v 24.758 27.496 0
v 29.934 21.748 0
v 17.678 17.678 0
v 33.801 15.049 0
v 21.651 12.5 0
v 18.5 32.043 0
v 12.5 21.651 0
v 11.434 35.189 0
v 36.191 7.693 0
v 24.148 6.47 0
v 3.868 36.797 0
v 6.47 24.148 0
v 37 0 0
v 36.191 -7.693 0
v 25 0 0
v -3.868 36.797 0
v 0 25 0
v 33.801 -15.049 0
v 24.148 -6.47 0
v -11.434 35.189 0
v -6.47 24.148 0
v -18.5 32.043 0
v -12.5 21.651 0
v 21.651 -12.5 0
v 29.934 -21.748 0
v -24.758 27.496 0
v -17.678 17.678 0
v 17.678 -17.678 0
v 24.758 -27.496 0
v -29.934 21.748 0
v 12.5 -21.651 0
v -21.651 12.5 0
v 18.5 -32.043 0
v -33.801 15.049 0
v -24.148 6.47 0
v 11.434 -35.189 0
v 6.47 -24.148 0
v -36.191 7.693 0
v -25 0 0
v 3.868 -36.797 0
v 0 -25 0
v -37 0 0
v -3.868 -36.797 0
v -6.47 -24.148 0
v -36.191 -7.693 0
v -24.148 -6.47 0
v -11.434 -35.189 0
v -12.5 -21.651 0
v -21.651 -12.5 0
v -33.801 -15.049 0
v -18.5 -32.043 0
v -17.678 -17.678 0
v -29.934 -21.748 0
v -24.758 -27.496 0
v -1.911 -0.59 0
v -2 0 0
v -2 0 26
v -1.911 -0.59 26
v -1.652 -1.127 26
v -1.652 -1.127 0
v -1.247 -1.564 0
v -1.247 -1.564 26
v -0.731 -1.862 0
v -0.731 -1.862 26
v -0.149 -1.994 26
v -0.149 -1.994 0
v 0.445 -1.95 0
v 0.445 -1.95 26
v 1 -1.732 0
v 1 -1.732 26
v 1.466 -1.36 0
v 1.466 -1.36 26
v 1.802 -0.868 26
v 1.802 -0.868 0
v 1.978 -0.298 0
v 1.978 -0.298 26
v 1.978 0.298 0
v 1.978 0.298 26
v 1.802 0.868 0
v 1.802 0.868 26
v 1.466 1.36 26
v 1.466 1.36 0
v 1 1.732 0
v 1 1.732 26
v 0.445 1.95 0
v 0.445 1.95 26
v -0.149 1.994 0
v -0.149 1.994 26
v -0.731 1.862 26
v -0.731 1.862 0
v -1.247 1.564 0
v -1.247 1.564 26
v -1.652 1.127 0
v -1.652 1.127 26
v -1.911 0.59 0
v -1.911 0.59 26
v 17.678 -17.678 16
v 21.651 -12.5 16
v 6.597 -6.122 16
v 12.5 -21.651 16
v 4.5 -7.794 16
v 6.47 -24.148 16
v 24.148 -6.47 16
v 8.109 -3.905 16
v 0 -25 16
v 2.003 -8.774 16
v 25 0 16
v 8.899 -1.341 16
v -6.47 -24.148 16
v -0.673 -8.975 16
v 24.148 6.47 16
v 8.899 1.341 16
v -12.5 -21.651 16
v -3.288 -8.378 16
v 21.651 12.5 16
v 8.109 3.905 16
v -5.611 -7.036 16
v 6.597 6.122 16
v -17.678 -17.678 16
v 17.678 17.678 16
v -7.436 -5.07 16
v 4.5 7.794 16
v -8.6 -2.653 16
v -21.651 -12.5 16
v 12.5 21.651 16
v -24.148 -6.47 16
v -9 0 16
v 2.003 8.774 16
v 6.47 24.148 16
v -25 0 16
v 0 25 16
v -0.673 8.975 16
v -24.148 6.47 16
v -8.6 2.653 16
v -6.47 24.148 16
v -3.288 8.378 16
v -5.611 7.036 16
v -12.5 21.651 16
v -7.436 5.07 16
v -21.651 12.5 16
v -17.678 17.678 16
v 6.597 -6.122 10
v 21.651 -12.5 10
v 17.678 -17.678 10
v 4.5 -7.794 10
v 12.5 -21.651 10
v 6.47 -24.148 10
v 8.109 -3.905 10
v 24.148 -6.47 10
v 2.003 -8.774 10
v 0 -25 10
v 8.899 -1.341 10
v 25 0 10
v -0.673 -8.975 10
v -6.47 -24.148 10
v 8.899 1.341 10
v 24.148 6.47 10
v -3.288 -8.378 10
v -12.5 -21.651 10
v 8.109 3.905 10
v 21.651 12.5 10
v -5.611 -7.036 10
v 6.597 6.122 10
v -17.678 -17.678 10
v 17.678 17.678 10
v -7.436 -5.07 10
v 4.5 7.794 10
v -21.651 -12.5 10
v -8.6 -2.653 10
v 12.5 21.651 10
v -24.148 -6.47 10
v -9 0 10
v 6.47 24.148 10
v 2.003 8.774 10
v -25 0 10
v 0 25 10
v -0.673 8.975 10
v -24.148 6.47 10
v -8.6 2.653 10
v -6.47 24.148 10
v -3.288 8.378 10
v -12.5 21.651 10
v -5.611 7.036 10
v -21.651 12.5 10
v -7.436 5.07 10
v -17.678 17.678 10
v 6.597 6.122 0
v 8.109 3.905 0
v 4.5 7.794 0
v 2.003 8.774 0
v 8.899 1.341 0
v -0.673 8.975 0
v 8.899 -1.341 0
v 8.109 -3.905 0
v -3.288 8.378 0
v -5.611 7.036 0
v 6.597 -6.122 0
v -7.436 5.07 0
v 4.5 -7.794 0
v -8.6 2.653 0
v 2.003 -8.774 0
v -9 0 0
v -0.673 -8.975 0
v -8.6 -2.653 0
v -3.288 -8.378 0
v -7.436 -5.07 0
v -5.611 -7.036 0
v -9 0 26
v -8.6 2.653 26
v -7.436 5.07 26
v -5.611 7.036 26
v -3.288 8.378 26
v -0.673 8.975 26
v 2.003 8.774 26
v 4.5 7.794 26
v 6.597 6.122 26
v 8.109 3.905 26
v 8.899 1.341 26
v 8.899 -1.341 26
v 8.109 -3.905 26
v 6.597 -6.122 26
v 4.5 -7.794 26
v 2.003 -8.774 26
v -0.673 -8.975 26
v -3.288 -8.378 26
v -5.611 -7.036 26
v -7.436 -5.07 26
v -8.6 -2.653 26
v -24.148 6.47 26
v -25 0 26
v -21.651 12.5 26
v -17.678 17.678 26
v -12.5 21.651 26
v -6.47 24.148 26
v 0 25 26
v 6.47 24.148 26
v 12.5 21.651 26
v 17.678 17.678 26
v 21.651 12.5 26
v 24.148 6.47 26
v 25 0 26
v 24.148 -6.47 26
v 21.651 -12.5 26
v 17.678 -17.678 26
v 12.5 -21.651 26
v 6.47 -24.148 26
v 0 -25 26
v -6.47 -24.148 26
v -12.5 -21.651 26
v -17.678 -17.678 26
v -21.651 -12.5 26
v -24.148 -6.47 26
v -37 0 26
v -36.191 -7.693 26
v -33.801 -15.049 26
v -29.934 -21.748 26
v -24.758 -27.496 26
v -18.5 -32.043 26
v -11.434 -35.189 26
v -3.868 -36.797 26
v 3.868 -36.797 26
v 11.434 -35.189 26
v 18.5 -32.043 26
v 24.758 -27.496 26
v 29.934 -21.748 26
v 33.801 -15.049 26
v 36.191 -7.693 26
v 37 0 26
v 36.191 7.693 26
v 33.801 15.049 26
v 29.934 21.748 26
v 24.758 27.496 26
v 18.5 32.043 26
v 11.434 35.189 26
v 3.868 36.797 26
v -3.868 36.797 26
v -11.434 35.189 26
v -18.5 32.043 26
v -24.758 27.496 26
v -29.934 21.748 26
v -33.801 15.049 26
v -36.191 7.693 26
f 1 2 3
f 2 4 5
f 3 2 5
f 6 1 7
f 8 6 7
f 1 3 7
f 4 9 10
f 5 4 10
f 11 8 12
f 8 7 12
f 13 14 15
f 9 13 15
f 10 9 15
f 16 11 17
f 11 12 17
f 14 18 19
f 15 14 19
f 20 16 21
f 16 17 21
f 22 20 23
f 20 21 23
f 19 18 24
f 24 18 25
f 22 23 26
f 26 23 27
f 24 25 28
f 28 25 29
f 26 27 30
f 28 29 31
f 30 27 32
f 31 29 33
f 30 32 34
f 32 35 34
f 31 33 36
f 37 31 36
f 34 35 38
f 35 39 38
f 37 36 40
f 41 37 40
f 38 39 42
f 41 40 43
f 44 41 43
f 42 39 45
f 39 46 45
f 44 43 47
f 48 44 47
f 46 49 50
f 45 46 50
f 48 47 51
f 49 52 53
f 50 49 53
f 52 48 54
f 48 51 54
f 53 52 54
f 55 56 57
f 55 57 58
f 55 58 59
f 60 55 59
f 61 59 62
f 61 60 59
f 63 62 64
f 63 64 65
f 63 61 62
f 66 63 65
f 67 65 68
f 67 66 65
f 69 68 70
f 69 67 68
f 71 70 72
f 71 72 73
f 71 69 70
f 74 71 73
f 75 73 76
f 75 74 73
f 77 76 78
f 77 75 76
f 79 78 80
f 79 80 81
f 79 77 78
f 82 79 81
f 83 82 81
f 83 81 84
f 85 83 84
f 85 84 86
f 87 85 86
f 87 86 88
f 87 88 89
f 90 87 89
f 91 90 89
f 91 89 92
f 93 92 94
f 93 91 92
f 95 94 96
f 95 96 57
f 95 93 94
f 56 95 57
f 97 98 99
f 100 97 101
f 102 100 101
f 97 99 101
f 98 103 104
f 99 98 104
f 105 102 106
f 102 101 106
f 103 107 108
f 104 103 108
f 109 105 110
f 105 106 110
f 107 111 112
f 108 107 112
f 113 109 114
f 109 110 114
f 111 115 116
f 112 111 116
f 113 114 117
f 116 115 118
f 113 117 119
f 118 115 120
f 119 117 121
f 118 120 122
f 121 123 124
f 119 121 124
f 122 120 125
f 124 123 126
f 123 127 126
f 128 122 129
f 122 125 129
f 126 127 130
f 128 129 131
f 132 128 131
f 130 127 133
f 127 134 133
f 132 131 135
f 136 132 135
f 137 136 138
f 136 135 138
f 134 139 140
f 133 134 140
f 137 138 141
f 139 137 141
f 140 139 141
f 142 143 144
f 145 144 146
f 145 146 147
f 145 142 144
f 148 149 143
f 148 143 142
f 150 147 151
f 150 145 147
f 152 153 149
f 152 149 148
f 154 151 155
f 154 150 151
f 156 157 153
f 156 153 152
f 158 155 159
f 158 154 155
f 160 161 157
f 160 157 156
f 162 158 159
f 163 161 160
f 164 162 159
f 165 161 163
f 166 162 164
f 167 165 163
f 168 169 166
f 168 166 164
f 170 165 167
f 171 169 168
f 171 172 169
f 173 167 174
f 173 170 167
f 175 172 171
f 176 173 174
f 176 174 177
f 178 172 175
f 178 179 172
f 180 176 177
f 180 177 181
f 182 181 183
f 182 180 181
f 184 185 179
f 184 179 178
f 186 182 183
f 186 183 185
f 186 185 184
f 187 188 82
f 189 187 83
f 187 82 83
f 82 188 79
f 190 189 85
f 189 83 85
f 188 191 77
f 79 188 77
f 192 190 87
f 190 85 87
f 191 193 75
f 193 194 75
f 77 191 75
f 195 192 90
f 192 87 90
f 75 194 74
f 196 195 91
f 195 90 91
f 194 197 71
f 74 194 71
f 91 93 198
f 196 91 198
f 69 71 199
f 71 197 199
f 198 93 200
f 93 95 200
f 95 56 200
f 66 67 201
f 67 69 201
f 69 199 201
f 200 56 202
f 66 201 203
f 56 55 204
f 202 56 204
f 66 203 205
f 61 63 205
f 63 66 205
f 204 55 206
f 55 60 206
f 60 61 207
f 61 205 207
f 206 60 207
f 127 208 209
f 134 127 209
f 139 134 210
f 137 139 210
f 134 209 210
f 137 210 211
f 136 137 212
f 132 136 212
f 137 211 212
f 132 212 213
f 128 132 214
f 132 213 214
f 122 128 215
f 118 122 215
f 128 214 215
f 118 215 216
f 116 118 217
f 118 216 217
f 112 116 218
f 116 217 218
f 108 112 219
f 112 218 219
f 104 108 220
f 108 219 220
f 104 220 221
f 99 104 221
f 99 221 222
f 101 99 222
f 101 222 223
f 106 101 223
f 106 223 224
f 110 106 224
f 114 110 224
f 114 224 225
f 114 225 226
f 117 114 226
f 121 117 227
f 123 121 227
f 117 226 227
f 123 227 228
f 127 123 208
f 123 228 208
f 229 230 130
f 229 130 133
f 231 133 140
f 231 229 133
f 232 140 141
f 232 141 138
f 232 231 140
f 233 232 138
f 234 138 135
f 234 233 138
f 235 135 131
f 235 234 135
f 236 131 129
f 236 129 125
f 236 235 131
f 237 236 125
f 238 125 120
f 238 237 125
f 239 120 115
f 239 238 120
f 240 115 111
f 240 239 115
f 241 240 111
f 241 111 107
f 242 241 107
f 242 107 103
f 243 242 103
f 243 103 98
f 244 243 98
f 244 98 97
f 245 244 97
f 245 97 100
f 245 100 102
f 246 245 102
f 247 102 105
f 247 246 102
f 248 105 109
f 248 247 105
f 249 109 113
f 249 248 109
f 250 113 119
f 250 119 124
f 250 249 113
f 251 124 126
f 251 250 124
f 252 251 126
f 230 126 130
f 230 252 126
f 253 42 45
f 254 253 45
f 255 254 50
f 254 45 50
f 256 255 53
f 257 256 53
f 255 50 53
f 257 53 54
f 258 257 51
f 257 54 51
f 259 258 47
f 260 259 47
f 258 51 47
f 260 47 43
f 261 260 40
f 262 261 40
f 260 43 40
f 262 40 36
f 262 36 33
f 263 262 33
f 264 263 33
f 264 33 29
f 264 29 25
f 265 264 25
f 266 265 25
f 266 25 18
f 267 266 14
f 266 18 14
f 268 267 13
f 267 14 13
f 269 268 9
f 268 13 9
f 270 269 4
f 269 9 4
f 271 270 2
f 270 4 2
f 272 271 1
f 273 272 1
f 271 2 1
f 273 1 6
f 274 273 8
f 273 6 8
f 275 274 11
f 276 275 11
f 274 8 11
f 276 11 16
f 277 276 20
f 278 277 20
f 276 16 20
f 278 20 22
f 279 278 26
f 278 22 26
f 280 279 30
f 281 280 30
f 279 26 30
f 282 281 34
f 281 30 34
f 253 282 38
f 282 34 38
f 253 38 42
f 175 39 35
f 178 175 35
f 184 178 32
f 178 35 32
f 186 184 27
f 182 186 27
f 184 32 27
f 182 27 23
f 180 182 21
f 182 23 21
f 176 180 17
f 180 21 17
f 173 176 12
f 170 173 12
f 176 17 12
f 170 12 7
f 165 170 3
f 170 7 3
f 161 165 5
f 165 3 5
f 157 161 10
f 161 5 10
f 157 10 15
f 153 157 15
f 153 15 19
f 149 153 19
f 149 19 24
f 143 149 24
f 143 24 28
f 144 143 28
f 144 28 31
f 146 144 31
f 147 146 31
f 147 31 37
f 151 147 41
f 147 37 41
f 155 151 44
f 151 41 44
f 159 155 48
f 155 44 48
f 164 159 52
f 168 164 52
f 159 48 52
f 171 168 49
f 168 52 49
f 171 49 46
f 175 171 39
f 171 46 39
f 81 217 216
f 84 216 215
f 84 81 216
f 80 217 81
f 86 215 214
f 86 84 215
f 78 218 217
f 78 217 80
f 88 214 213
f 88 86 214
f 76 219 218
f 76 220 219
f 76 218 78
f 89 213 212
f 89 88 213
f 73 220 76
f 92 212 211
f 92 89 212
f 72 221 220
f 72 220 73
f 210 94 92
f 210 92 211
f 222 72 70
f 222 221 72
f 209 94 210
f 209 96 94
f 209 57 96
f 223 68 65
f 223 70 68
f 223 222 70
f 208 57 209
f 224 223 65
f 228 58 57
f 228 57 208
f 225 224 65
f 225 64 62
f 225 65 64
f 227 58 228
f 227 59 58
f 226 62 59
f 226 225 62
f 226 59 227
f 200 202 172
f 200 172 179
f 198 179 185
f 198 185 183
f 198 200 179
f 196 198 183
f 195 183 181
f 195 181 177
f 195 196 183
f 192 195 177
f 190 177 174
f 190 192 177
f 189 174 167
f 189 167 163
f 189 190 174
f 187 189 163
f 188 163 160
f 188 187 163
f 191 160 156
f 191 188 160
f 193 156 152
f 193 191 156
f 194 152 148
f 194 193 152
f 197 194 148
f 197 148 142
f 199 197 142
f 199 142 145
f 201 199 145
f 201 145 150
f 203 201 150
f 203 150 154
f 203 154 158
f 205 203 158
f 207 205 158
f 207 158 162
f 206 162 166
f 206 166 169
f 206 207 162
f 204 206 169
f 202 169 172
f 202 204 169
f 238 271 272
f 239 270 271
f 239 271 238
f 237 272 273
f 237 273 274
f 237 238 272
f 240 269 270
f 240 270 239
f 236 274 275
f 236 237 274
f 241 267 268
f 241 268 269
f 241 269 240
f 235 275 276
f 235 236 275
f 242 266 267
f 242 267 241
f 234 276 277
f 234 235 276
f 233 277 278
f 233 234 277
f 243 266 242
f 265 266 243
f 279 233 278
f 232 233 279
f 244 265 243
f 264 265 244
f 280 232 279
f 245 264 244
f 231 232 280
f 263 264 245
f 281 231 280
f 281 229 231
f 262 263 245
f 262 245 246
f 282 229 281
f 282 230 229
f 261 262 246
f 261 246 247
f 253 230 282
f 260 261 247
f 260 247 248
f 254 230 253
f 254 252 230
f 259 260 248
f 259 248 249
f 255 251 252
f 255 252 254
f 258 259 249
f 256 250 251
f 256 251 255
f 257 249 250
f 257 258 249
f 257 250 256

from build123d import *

# Parameters (mm, degrees)
SKETCH1_R           = 37
SKETCH1_R_2         = 2
BOSS_EXTRUDE1_DEPTH = 26
SKETCH2_R           = 25
SKETCH2_R_2         = 9
CUT_EXTRUDE1_DEPTH  = 10


with BuildPart() as part:
    # Sketch1 → Boss-Extrude1 (new body)
    with BuildSketch(Plane.XY):
        with Locations(Location((0, 0, 0), (0, 0, 180))):
            Circle(SKETCH1_R)
        with Locations(Location((0, 0, 0), (0, 0, 180))):
            Circle(SKETCH1_R_2, mode=Mode.SUBTRACT)
    extrude(amount=BOSS_EXTRUDE1_DEPTH)

    # Sketch2 → Cut-Extrude1 (cut)
    with BuildSketch(Plane(origin=(0, 0, 0), x_dir=(-1, 0, 0), z_dir=(0, 0, -1))):
        Circle(SKETCH2_R)
        Circle(SKETCH2_R_2, mode=Mode.SUBTRACT)
    cut_extrude1 = extrude(amount=-CUT_EXTRUDE1_DEPTH, mode=Mode.SUBTRACT)

    # Mirror1: Cut-Extrude1 across plane
    add(cut_extrude1.mirror(Plane(origin=(0, 0, 13), x_dir=(1, 0, 0), z_dir=(0, 0, -1))), mode=Mode.SUBTRACT)


solid = part.part
